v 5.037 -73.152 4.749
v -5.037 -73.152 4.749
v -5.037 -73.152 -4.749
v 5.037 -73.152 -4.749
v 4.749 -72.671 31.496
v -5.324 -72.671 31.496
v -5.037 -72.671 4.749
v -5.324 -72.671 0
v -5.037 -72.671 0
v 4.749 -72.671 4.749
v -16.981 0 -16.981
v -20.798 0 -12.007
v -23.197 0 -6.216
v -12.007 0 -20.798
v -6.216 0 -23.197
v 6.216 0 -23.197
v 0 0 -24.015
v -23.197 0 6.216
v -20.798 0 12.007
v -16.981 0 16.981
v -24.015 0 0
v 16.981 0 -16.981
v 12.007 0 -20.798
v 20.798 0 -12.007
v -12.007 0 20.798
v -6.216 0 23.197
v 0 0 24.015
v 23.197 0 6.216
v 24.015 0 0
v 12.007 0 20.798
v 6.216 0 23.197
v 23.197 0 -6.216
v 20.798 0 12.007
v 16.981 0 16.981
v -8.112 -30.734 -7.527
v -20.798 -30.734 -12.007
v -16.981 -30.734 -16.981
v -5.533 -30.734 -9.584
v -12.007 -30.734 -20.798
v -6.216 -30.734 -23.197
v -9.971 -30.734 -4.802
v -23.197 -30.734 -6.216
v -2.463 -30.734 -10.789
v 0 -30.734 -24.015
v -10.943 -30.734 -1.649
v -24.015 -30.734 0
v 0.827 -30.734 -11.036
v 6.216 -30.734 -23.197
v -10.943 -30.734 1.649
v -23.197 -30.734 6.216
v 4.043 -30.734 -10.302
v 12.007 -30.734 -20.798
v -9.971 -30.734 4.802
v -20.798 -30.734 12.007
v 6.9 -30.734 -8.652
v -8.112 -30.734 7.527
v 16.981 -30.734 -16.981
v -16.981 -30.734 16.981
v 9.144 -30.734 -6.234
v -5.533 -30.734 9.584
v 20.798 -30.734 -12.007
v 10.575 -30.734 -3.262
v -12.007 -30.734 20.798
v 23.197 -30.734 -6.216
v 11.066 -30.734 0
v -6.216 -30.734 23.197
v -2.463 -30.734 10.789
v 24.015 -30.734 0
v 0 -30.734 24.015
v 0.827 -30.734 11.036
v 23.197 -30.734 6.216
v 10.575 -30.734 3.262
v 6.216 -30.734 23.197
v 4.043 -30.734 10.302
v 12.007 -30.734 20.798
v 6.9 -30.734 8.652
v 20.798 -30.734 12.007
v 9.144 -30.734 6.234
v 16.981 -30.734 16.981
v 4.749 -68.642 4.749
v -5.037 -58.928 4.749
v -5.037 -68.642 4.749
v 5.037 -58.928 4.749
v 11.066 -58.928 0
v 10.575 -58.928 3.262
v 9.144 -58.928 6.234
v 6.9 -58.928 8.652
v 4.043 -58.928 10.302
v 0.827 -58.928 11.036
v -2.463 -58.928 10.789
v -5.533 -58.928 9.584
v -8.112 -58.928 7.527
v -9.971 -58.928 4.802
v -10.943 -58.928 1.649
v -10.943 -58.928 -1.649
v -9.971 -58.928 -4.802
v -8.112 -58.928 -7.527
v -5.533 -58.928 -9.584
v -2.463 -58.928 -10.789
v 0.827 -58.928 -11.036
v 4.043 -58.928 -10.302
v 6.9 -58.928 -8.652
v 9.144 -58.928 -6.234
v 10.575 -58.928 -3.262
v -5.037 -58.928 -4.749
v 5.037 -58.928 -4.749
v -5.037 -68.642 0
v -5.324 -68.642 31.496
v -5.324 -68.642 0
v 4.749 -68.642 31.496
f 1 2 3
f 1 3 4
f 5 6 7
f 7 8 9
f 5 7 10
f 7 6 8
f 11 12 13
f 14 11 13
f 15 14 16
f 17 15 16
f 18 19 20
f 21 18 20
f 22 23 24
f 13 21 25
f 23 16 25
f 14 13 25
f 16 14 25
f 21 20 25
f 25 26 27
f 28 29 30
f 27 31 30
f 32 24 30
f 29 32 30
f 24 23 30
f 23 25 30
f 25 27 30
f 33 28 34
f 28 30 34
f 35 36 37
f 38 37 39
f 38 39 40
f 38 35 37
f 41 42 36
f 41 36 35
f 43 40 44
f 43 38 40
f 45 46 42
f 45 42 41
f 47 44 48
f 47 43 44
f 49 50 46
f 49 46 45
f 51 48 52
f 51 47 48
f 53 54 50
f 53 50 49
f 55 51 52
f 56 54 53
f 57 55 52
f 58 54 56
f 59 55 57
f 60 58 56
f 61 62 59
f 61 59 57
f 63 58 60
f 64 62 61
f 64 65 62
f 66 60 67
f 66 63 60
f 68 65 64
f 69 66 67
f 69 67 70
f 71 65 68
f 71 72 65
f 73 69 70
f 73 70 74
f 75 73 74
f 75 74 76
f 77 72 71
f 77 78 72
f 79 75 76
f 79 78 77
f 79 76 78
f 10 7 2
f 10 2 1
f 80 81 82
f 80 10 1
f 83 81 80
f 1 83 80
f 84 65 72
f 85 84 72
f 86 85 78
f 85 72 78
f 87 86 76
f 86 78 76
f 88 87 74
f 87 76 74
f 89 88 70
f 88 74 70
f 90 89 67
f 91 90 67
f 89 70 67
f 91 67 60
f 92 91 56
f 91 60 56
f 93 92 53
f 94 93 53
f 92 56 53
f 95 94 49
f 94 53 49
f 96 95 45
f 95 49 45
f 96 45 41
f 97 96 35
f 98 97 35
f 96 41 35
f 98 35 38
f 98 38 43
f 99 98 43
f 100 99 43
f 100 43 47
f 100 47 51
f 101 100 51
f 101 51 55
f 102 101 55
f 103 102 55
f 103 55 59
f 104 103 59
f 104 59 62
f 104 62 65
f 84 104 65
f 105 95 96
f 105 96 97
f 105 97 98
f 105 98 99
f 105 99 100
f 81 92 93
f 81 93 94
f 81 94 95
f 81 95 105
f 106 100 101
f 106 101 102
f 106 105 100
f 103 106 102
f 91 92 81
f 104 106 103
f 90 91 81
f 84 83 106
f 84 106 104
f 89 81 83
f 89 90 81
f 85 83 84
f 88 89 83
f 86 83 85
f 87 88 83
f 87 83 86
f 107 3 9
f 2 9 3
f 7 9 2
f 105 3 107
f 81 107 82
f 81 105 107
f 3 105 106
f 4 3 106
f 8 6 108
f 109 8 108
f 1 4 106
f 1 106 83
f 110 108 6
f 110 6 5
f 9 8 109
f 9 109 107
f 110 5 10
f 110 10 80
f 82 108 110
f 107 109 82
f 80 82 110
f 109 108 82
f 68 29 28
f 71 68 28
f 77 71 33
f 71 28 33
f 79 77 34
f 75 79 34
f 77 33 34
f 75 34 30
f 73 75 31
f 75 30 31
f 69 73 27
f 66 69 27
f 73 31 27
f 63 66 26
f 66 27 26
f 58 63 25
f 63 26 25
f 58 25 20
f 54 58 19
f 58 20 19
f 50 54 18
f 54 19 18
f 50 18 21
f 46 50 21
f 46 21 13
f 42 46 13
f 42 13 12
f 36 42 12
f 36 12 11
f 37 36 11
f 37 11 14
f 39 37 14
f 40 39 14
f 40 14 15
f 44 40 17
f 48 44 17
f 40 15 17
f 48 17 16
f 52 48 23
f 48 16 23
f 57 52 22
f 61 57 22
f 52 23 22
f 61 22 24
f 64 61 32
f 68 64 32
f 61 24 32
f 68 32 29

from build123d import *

# Parameters (mm, degrees)
F0_R     = 24.014972
F1_DEPTH = 30.734
F2_R     = 11.066497
F3_DEPTH = 58.928
F4_W     = 10.073201
F4_H     = 9.49759
F5_DEPTH = 73.152
F6_W     = 10.073201
F6_H     = 4.029282
F7_DEPTH = 31.496


with BuildPart() as f1:
    # F0 (on Front) → F1 (new body)
    with BuildSketch(Plane.XZ):
        Circle(F0_R)
    extrude(amount=F1_DEPTH)

    # F2 (on Front) → F3 (join)
    with BuildSketch(Plane.XZ):
        Circle(F2_R)
    extrude(amount=F3_DEPTH)

    # F4 (on Front) → F5 (join)
    with BuildSketch(Plane.XZ):
        with Locations((1e-06, 0)):
            Rectangle(F4_W, F4_H)
    extrude(amount=F5_DEPTH)

    # F6 (on Top) → F7 (join)
    with BuildSketch(Plane.XY):
        with Locations((-0.287809, -70.656318)):
            Rectangle(F6_W, F6_H)
    extrude(amount=F7_DEPTH)


solid = f1.part
